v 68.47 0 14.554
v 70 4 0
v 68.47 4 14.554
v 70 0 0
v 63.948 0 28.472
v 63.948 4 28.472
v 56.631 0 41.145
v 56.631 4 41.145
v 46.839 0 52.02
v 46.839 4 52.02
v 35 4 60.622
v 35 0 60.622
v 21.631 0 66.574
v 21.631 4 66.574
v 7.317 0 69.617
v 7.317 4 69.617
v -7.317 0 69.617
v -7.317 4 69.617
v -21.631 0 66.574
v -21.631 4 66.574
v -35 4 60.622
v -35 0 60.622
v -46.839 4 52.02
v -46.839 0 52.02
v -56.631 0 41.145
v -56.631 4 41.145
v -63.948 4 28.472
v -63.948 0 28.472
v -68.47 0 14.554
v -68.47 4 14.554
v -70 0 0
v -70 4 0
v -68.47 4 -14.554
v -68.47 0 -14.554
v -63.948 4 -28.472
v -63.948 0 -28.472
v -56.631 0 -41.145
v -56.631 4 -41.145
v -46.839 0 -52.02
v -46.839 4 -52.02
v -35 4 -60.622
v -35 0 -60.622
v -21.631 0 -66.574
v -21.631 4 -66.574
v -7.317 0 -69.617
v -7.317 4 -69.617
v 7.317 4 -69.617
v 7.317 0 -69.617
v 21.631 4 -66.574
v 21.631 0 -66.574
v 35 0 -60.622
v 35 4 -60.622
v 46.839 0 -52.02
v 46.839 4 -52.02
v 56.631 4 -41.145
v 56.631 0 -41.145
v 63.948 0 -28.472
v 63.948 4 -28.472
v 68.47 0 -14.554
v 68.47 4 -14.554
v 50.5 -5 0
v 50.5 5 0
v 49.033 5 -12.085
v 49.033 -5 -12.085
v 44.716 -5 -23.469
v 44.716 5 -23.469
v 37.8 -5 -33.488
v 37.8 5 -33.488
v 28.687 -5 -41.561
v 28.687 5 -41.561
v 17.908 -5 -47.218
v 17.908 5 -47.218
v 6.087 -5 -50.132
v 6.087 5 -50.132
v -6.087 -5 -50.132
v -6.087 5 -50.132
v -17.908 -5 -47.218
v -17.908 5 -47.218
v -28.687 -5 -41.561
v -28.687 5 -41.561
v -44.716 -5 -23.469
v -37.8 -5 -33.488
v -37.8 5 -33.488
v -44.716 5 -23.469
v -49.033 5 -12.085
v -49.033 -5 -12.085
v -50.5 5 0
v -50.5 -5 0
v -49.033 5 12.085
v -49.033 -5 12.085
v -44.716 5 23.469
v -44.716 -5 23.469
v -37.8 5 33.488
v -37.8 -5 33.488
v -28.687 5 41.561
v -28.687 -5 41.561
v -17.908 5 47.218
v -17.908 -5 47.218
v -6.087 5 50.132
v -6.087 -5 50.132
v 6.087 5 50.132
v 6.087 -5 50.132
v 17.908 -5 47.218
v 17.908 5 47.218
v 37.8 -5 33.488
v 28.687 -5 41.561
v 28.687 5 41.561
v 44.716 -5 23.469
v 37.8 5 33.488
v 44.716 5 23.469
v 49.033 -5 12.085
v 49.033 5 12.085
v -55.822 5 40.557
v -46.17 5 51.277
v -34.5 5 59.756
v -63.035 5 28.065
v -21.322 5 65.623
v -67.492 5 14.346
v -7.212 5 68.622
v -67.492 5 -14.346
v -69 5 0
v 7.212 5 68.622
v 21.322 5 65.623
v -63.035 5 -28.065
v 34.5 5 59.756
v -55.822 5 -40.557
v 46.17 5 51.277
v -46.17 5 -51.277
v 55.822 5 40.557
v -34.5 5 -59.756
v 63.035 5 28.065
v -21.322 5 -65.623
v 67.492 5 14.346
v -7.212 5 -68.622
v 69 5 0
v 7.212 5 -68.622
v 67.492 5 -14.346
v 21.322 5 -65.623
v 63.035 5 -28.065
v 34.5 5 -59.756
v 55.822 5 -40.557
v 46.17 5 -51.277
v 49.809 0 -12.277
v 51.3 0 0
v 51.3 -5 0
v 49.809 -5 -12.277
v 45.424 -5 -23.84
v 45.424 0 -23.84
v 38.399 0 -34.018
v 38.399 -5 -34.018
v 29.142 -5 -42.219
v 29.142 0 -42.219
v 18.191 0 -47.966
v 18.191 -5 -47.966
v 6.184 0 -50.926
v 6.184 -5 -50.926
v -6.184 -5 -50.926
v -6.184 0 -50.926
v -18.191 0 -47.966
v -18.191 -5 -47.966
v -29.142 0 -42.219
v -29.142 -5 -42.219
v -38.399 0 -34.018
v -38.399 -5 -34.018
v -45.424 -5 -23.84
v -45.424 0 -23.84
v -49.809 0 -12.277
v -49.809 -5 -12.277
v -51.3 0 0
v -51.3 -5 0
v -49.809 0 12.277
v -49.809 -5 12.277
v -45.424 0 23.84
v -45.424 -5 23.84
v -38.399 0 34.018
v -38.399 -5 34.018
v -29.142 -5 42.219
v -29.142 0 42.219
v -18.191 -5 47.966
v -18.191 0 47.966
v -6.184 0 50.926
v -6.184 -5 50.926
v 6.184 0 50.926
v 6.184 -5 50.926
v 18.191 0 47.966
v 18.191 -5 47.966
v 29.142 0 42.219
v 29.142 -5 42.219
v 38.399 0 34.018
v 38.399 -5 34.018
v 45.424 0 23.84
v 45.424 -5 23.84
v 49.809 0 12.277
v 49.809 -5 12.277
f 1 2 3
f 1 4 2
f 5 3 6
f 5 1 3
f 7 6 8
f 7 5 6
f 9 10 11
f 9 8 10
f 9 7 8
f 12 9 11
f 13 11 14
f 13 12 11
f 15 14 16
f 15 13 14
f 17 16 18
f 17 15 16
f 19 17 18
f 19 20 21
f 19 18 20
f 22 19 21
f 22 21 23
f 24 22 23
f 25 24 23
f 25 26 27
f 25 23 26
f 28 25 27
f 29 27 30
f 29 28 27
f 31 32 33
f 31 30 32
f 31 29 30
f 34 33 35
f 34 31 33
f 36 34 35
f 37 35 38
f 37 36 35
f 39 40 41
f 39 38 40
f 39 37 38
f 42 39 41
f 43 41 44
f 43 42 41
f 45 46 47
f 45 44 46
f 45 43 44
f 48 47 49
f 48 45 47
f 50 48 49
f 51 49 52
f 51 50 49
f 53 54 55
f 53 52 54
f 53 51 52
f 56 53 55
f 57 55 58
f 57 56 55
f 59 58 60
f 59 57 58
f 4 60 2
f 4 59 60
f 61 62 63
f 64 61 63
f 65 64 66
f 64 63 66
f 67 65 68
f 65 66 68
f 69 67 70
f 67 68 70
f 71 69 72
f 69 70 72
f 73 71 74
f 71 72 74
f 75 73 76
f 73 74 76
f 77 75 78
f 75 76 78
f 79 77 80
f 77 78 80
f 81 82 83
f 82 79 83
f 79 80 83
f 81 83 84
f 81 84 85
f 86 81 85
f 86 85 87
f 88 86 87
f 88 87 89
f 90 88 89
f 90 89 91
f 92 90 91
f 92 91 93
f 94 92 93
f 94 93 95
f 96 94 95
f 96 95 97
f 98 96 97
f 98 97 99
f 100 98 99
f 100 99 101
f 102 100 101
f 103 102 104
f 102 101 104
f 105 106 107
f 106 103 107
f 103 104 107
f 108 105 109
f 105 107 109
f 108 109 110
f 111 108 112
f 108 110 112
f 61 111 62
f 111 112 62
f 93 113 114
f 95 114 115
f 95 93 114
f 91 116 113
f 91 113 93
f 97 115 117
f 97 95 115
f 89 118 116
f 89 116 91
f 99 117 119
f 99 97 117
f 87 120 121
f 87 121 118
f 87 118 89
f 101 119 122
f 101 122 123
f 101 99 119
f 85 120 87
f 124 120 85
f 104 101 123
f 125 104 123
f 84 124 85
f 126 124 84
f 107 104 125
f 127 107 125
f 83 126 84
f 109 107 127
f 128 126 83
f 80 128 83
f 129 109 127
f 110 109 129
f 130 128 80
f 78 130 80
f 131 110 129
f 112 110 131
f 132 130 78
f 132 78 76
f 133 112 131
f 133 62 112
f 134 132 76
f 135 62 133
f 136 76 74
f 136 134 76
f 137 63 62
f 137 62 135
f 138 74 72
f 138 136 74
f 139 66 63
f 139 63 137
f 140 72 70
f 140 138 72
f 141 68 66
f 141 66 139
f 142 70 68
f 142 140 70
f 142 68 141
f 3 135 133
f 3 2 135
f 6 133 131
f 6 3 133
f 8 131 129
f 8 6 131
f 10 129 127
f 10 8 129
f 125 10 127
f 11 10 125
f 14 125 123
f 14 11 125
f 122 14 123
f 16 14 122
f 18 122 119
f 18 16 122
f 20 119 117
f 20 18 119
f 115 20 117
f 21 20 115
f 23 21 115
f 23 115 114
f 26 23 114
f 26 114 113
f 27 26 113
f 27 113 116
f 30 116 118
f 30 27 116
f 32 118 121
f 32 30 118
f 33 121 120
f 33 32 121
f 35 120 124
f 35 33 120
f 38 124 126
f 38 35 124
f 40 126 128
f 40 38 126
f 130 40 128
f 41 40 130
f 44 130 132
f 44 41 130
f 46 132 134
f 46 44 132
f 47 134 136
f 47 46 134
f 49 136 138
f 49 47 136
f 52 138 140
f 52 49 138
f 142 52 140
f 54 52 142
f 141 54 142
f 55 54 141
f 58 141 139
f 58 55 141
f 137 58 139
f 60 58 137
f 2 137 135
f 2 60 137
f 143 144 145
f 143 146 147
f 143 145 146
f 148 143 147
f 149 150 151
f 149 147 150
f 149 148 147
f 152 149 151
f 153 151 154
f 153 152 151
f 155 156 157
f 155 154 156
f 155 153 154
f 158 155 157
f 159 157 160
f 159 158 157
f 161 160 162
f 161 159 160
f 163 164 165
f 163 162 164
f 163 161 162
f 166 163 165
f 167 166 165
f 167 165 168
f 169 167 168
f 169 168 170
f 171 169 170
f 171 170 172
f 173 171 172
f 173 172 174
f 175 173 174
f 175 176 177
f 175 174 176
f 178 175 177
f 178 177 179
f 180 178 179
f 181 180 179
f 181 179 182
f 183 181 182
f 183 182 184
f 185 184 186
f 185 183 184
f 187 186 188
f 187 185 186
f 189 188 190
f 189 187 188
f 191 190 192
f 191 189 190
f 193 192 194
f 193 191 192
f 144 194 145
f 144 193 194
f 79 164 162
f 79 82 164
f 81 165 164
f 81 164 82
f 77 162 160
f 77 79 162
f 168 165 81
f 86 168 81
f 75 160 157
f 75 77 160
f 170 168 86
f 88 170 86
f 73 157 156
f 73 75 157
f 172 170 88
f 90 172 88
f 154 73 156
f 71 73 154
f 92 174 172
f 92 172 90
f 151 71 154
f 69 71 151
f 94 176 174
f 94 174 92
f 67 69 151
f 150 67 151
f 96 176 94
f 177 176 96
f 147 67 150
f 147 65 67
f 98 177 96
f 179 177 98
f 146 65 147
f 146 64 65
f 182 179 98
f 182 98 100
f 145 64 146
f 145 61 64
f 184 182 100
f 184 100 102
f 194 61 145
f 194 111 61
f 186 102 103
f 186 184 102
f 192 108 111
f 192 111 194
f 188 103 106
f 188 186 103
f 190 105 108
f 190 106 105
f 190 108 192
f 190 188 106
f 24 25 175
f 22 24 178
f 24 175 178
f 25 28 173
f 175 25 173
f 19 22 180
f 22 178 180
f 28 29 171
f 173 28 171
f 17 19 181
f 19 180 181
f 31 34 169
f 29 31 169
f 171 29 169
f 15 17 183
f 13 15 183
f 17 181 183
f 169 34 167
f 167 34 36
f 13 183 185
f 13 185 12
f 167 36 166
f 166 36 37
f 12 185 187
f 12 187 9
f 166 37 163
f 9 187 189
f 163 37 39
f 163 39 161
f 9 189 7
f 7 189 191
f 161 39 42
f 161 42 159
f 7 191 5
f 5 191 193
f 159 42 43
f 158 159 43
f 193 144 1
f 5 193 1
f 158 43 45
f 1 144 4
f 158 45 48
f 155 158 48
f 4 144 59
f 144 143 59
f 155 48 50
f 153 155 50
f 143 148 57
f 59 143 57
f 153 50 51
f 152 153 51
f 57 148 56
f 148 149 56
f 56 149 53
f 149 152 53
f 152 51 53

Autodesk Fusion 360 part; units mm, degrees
sketch "Sketch1" plane through (0, 0, 0) normal (0, 1, 0) x (1, 0, 0)
  circle A0 centre (0, 0) radius 50.5
  circle A1 centre (0, 0) radius 70
  dimension "d1" = 101
  dimension "d2" = 140
extrude "Extrude1" add sketch "Sketch1" along normal blind 5
chamfer "Chamfer1" distance 1 angle 45 1 edges at (-65.2629, 5, 25.3131)
sketch "Sketch2" plane through (0, 0, 0) normal (0, -1, 0) x (1, 0, 0)
  circle A0 centre (0, 0) radius 50.5
  circle A1 centre (0, 0) radius 70
  circle A2 centre (0, 0) radius 50.5
  circle A3 centre (0, 0) radius 51.3
  dimension "d6" = 102.6
extrude "Extrude2" add sketch "Sketch2" along normal blind 5 contours A3
equation "d6 = 101.000 mm + 0.8 * 2 mm"
